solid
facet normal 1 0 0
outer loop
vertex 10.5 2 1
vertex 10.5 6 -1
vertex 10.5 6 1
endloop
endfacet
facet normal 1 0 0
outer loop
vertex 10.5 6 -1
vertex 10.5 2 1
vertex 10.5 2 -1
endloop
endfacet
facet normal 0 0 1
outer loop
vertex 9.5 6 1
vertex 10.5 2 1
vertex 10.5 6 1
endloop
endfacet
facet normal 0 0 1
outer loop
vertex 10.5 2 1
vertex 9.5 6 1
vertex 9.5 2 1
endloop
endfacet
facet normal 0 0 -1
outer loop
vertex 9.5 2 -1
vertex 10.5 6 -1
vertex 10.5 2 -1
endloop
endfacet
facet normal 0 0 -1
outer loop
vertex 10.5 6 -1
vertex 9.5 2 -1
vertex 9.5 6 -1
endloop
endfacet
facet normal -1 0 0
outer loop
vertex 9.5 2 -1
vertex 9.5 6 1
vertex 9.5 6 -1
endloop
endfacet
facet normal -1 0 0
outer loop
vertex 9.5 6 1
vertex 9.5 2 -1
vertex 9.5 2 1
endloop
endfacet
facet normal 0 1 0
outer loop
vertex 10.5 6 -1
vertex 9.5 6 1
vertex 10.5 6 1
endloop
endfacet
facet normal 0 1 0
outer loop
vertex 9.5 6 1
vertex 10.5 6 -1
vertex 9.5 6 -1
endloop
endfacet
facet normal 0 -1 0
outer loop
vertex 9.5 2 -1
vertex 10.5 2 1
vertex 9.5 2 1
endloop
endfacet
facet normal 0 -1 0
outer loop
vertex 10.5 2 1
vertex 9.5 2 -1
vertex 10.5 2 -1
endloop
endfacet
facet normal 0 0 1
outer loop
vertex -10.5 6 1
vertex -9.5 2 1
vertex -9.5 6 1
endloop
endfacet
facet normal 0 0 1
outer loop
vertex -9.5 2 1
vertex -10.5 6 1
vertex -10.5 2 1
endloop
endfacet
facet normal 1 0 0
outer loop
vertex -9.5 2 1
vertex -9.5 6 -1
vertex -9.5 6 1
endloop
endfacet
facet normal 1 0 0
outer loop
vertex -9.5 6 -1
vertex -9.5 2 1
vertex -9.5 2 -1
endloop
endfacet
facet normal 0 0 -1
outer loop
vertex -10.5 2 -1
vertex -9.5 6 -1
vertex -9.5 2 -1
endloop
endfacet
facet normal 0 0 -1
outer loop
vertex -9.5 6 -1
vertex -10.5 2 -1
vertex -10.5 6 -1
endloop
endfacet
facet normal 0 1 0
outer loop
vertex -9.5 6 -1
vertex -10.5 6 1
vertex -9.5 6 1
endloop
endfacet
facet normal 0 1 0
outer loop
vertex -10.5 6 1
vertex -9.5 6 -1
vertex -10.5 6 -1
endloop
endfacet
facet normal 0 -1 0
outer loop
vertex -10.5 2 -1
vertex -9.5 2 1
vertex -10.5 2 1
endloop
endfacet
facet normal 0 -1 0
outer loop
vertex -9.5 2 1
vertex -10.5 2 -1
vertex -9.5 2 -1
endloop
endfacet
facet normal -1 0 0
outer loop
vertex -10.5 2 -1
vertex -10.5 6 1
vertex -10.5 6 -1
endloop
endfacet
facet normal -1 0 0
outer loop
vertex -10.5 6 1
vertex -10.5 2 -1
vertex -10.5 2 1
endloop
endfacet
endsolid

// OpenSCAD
translate([10, 4, 0]) {
    cube(size=[1, 4, 2], center=true);
};

mirror(v=[1, 0, 0]) {
    translate([10, 4, 0]) {
        cube(size=[1, 4, 2], center=true);
    };
};
